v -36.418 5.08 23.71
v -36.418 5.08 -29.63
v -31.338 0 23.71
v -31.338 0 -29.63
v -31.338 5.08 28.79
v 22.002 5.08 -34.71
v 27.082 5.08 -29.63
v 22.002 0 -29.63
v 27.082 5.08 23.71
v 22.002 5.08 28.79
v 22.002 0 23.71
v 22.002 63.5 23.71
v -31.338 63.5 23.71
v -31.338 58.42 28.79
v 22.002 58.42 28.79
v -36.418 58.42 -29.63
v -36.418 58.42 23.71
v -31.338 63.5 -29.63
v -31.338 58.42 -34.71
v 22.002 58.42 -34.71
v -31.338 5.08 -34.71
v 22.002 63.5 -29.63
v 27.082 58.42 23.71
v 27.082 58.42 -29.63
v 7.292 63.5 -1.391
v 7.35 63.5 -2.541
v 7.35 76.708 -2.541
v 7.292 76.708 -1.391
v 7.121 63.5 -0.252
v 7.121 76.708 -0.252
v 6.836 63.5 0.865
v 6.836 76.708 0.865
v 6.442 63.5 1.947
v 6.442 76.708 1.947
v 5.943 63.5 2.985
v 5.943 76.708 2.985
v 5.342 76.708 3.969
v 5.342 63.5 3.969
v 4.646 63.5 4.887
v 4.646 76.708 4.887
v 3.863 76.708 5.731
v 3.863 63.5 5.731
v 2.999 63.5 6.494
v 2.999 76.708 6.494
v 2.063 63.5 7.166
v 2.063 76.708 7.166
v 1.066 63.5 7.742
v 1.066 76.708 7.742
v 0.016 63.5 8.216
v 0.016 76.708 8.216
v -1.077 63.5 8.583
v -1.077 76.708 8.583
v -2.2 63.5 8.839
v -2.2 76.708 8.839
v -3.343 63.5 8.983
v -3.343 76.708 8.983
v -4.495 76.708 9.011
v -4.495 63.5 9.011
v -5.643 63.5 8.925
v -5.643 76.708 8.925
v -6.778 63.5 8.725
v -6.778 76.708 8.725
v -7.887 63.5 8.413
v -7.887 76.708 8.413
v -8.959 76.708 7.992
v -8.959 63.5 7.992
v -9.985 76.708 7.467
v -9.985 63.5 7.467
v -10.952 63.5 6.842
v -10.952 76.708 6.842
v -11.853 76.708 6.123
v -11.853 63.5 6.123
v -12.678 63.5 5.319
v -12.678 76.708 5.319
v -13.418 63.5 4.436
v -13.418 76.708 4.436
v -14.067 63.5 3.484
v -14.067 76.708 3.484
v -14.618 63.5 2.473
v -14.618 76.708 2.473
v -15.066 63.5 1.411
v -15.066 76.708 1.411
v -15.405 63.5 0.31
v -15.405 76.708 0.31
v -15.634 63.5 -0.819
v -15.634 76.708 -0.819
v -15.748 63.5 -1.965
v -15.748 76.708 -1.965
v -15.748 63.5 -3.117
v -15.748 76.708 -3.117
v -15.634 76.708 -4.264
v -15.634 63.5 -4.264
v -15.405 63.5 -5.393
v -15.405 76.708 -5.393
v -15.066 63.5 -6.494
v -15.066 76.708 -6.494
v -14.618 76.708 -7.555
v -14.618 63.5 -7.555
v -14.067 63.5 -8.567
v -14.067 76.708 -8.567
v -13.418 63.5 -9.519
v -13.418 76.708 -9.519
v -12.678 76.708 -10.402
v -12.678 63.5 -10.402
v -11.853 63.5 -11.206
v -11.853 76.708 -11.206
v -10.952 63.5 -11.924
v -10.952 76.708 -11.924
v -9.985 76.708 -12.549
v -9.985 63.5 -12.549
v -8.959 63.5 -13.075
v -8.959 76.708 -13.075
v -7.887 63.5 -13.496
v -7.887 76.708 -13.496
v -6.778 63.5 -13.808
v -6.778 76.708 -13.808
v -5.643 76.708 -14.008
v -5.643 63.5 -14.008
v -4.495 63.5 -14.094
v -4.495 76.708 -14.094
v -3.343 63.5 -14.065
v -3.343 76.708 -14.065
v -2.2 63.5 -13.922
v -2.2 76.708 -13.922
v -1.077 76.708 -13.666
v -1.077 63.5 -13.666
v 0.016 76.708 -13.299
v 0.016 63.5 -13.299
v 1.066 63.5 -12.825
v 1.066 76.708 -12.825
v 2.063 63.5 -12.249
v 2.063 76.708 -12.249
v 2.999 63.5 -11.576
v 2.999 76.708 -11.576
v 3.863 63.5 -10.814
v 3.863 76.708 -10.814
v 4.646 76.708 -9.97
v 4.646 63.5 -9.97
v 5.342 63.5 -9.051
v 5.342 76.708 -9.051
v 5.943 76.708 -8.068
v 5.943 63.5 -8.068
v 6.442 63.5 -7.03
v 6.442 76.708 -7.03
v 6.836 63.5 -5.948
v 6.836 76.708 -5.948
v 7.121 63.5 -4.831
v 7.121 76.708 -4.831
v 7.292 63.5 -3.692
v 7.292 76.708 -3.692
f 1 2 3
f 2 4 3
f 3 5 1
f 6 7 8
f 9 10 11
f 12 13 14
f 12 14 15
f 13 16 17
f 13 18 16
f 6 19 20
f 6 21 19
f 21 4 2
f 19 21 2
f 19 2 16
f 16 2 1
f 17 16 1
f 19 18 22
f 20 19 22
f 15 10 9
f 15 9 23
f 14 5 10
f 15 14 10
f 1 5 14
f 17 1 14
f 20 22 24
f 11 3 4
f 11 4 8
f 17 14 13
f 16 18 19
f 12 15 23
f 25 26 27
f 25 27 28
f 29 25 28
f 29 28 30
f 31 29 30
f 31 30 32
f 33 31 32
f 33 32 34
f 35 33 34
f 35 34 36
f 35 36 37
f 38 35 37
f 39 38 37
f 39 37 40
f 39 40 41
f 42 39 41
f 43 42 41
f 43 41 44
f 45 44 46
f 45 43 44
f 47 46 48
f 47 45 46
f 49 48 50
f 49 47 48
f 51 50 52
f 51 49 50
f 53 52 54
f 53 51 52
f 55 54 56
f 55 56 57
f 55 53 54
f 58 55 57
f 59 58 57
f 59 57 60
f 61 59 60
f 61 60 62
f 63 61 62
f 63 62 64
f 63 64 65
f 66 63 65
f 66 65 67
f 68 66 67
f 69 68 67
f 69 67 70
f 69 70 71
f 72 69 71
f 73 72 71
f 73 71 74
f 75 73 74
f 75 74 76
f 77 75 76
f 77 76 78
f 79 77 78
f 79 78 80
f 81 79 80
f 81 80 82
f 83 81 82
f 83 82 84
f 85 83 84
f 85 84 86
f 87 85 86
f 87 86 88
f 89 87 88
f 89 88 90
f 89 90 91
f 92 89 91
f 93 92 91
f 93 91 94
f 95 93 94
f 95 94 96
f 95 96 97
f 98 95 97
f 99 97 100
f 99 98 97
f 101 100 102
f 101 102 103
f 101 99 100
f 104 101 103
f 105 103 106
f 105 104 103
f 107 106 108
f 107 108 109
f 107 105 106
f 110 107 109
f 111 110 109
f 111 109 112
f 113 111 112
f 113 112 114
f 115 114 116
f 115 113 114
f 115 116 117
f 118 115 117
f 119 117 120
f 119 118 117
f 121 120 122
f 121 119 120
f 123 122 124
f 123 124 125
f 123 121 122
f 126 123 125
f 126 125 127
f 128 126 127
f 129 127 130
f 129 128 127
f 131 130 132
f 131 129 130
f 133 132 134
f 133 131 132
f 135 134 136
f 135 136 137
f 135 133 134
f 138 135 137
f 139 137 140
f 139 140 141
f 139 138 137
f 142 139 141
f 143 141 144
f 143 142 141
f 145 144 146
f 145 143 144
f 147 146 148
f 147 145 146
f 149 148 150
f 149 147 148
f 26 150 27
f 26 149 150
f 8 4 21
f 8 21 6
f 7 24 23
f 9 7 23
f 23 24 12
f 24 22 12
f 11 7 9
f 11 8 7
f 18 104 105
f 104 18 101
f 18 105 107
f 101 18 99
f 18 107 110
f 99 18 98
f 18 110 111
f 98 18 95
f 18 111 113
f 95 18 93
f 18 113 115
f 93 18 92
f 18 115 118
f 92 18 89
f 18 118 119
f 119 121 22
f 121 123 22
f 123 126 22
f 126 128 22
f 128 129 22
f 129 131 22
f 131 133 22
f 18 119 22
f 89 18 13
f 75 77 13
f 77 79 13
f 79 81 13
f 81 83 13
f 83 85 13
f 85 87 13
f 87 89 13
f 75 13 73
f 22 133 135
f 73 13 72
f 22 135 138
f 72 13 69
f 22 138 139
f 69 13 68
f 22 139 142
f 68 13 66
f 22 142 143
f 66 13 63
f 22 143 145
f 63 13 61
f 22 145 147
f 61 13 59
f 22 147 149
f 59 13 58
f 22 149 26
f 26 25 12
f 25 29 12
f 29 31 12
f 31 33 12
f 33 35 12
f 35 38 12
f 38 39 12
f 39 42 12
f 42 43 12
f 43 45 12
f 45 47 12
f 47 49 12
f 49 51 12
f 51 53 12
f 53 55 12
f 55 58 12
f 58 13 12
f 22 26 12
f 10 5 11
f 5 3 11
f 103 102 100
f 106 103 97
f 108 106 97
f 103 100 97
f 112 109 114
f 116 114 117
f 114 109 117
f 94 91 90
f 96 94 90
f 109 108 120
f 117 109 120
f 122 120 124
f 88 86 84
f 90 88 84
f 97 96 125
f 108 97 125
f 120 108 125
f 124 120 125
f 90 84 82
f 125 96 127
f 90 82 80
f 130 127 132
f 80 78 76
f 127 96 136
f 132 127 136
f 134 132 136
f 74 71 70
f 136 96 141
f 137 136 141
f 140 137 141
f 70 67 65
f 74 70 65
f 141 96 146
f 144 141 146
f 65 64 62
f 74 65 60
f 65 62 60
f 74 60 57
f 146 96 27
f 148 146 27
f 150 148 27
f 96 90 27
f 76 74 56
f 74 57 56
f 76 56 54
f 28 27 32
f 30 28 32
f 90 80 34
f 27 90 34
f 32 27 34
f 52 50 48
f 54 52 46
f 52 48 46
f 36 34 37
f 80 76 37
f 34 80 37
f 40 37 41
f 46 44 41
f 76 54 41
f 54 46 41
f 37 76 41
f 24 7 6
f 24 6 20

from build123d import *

# Parameters (mm, degrees)
F0_W     = 63.5
F0_H     = 63.5
F1_DEPTH = 63.5
F2_SIZE  = 5.08
F3_R     = 11.556322
F4_DEPTH = 76.708


with BuildPart() as f1:
    # F0 (on Front) → F1 (new body)
    with BuildSketch(Plane.XZ):
        with Locations((-4.667691, -2.960291)):
            Rectangle(F0_W, F0_H)
    extrude(amount=-F1_DEPTH)

    # F2
    f2_edges = [f1.edges().sort_by_distance(p)[0] for p in [
        (-4.667691, 0, 28.789709),
        (27.082309, 31.75, 28.789709),
        (-36.417691, 31.75, 28.789709),
        (-4.667691, 63.5, 28.789709),
        (27.082309, 0, -2.960291),
        (27.082309, 63.5, -2.960291),
        (-36.417691, 0, -2.960291),
        (-36.417691, 63.5, -2.960291),
        (-4.667691, 63.5, -34.710291),
        (27.082309, 31.75, -34.710291),
        (-4.667691, 0, -34.710291),
        (-36.417691, 31.75, -34.710291),
    ]]
    chamfer(f2_edges, length=F2_SIZE)

    # F3 (on face) → F4 (join)
    with BuildSketch(Plane.XZ):
        with Locations((-4.20644, -2.541391)):
            Circle(F3_R)
    extrude(amount=-F4_DEPTH)


solid = f1.part
